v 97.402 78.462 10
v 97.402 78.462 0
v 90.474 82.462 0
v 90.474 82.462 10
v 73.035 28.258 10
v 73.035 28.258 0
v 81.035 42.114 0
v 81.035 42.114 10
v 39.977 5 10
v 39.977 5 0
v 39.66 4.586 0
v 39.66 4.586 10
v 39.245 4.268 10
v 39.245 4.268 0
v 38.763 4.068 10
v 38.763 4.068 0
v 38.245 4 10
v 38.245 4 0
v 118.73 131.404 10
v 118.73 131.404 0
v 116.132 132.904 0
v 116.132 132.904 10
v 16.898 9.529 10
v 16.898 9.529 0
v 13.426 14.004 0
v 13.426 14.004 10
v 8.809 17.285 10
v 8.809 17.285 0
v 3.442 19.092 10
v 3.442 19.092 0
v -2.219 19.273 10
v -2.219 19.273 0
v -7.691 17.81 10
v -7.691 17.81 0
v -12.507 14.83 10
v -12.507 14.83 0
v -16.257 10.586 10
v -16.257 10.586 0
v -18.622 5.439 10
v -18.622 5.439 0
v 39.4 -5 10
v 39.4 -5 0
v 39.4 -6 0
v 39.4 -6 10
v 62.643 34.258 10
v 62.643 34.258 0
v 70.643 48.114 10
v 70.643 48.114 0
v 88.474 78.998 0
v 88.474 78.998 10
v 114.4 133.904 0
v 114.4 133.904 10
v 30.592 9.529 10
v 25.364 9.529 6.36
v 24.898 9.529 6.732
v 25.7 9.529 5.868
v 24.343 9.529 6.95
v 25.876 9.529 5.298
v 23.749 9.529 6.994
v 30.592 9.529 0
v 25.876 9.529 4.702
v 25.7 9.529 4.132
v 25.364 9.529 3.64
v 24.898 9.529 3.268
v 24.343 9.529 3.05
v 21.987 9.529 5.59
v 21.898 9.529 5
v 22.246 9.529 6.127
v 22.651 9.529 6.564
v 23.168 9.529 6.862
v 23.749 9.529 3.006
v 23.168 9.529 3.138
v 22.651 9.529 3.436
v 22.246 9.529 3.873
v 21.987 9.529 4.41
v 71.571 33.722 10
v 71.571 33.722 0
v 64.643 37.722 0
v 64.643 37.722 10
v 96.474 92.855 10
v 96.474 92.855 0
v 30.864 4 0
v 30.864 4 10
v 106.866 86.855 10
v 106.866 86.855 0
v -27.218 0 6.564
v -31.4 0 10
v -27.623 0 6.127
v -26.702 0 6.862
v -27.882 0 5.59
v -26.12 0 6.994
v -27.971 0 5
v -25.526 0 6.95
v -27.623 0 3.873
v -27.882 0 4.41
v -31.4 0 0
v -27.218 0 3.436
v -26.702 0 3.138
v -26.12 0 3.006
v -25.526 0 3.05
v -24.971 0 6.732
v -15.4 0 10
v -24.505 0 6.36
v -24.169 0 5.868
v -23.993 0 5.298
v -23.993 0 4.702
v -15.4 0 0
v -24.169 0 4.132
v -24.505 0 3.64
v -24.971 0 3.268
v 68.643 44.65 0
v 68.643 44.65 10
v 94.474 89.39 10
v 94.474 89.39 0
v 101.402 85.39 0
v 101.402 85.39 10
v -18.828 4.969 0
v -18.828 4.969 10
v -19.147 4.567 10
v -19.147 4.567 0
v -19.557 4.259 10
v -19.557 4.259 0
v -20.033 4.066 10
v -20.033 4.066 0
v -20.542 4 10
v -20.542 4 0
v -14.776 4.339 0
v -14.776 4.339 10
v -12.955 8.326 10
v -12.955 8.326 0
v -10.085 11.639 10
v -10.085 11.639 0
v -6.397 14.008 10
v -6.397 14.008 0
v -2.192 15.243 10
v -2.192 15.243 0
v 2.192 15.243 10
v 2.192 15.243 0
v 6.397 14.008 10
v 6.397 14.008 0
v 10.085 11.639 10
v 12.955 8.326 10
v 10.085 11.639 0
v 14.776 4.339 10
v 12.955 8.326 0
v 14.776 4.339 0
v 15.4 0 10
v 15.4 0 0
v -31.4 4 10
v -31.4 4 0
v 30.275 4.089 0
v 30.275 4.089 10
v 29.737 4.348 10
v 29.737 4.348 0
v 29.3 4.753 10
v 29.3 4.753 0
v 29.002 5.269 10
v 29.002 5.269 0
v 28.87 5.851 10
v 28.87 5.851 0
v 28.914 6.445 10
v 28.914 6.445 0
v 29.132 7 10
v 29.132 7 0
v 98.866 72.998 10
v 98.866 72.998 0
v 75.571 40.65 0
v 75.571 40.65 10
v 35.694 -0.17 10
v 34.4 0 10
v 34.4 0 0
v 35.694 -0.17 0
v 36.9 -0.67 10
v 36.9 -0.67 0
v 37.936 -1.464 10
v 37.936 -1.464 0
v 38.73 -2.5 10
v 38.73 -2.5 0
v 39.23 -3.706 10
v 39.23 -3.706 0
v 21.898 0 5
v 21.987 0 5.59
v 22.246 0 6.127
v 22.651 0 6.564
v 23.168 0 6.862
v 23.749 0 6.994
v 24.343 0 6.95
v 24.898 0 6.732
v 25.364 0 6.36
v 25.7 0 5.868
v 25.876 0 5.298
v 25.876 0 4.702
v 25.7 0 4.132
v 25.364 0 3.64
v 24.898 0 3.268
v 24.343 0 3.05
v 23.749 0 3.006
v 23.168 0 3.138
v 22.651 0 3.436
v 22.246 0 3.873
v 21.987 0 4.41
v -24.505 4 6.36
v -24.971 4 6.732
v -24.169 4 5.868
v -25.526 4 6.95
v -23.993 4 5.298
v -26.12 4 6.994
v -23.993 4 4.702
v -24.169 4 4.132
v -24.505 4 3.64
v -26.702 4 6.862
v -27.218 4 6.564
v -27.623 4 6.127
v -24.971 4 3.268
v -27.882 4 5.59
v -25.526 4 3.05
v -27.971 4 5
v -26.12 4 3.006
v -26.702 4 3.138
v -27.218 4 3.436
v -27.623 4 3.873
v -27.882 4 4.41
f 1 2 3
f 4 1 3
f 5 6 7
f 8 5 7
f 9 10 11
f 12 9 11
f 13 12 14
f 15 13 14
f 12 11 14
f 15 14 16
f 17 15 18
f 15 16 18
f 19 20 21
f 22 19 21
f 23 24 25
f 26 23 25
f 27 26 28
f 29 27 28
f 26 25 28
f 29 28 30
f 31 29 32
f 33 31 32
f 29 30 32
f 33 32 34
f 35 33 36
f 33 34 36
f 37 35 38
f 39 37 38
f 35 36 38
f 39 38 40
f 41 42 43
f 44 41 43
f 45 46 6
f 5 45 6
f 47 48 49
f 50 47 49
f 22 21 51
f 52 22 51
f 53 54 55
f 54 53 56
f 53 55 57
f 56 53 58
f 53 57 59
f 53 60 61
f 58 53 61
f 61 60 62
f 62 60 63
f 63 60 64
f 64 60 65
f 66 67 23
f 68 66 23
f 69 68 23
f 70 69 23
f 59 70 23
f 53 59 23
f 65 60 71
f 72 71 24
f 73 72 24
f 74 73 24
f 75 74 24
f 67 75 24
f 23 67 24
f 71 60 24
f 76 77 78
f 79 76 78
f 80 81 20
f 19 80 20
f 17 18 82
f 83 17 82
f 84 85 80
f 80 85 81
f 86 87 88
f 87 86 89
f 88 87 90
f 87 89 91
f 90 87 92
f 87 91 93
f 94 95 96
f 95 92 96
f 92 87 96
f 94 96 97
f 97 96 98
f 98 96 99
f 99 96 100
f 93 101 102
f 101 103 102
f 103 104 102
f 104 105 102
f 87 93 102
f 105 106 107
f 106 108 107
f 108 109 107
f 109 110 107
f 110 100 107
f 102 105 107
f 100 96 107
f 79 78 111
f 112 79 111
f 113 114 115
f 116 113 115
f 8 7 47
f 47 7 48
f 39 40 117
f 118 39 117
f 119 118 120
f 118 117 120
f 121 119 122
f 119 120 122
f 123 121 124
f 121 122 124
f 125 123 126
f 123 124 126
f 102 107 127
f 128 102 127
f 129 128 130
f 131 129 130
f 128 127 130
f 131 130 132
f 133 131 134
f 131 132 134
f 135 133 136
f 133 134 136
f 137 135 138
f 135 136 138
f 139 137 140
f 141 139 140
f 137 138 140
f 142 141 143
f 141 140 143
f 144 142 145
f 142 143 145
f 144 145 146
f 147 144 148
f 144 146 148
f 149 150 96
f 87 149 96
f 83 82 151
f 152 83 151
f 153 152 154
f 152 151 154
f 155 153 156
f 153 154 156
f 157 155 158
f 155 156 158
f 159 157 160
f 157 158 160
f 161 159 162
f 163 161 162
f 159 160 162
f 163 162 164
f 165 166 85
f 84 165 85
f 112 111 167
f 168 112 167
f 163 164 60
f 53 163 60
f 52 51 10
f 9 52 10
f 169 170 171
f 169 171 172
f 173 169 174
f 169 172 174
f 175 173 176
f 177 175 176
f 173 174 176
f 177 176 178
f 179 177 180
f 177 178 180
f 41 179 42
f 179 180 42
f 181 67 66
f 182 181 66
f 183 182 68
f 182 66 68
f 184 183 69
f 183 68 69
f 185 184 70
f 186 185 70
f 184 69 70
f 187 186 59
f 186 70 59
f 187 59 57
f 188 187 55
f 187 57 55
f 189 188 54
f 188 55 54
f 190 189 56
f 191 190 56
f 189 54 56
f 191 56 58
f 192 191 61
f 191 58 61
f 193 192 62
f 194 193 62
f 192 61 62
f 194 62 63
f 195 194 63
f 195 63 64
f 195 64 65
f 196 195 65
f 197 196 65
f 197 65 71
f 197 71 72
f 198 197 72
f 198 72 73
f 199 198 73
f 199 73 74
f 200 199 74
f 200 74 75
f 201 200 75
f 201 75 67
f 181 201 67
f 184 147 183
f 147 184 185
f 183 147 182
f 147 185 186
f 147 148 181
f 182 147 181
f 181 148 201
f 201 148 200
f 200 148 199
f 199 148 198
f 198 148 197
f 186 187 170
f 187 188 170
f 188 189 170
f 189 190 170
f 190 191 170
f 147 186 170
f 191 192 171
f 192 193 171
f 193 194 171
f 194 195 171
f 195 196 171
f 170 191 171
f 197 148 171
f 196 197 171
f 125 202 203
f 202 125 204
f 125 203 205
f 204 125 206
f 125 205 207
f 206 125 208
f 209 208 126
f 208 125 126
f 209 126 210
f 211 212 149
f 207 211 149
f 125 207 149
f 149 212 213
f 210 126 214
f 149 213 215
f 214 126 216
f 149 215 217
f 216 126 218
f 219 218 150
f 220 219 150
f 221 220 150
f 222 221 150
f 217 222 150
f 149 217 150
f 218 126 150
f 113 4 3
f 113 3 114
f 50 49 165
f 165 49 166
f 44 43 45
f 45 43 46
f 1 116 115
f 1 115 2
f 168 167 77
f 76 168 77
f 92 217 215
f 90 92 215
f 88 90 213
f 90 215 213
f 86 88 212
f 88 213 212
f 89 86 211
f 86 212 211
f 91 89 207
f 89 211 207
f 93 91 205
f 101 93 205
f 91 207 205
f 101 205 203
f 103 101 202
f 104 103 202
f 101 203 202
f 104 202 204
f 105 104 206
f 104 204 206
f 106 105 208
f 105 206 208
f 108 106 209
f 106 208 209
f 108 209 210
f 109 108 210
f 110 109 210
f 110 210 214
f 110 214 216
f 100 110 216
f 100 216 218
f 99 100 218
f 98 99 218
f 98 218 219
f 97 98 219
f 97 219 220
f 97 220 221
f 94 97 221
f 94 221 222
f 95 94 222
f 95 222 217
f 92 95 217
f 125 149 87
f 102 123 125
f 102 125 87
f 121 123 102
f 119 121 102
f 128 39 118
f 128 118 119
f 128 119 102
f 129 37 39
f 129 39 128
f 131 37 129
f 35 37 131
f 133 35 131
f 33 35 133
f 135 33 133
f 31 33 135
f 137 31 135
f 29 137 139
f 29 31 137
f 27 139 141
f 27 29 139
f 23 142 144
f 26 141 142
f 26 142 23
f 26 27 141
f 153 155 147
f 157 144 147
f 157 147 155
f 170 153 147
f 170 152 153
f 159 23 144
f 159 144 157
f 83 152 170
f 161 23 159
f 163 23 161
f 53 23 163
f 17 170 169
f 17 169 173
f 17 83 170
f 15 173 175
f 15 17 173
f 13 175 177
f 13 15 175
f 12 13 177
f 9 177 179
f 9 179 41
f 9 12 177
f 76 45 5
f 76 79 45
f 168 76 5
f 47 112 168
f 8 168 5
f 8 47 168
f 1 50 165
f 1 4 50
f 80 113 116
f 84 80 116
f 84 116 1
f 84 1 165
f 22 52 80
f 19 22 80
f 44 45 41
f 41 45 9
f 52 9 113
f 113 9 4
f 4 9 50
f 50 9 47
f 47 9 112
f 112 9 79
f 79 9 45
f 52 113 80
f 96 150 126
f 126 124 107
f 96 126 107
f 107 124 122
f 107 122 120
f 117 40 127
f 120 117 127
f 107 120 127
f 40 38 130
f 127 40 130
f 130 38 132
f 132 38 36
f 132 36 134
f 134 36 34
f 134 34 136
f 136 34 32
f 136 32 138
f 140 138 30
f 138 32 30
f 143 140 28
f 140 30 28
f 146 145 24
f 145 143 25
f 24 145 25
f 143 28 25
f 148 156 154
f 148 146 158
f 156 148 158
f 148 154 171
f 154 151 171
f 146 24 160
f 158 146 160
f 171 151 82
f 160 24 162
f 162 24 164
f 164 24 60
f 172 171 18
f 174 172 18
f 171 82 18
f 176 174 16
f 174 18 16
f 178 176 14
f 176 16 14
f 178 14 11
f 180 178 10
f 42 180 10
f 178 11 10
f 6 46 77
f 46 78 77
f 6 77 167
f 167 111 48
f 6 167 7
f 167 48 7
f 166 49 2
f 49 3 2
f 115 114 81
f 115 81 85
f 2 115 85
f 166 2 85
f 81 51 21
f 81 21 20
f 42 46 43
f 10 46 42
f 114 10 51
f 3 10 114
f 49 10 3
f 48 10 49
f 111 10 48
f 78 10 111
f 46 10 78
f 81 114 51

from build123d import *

# Parameters (mm, degrees)
F1_DEPTH = 10
F2_R     = 2
F3_DEPTH = 10.001
F4_R     = 2
F5_DEPTH = 15.530304


with BuildPart() as f1:
    # F0 (on Top) → F1 (new body)
    with BuildSketch(Plane.XY):
        with BuildLine():
            ThreePointArc((-15.4, 0), (0, 15.4), (15.4, 0))
            Line((15.4, 0), (19.4, 0))
            Line((19.4, 0), (34.4, 0))
            ThreePointArc((34.4, 0), (37.935534, -1.464466), (39.4, -5))
            Line((39.4, -5), (39.4, -6))
            Line((39.4, -6), (62.642914, 34.257907))
            Line((62.642914, 34.257907), (64.642914, 37.722009))
            Line((64.642914, 37.722009), (68.642914, 44.650212))
            Line((68.642914, 44.650212), (70.642914, 48.114314))
            Line((70.642914, 48.114314), (88.473701, 78.998144))
            Line((88.473701, 78.998144), (90.473701, 82.462245))
            Line((90.473701, 82.462245), (94.473701, 89.390449))
            Line((94.473701, 89.390449), (96.473701, 92.85455))
            Line((96.473701, 92.85455), (118.730127, 131.403811))
            Line((118.730127, 131.403811), (116.132051, 132.903811))
            Line((116.132051, 132.903811), (114.4, 133.903811))
            Line((114.4, 133.903811), (39.97735, 5))
            ThreePointArc((39.97735, 5), (39.245299, 4.267949), (38.245299, 4))
            Line((38.245299, 4), (30.864102, 4))
            ThreePointArc((30.864102, 4), (29.132051, 5), (29.132051, 7))
            Line((29.132051, 7), (30.592345, 9.529304))
            Line((30.592345, 9.529304), (16.898295, 9.529304))
            ThreePointArc((16.898295, 9.529304), (-2.219193, 19.272654), (-18.621883, 5.439252))
            ThreePointArc((-18.621883, 5.439252), (-19.341977, 4.399766), (-20.541665, 4))
            Line((-20.541665, 4), (-31.4, 4))
            Line((-31.4, 4), (-31.4, 0))
            Line((-31.4, 0), (-19.4, 0))
            Line((-19.4, 0), (-15.4, 0))
        make_face()
        Polygon((64.642914, 37.722009), (62.642914, 34.257907), (73.035219, 28.257907), (81.035219, 42.114314), (70.642914, 48.114314), (68.642914, 44.650212), (75.571117, 40.650212), (71.571117, 33.722009), align=None)
        Polygon((90.473701, 82.462245), (88.473701, 78.998144), (98.866006, 72.998144), (106.866006, 86.85455), (96.473701, 92.85455), (94.473701, 89.390449), (101.401904, 85.390449), (97.401904, 78.462245), align=None)
    extrude(amount=F1_DEPTH)

    # F2 (on face) → F3 (cut, through all)
    with BuildSketch(Plane(origin=(0, 4, 0), x_dir=(-1, 0, 0), z_dir=(0, 1, 0))):
        with Locations((25.970832, 5)):
            Circle(F2_R)
    extrude(amount=-F3_DEPTH, mode=Mode.SUBTRACT)

    # F4 (on face) → F5 (cut, through all)
    with BuildSketch(Plane(origin=(0, 9.529304, 0), x_dir=(-1, 0, 0), z_dir=(0, 1, 0))):
        with Locations((-23.898295, 5)):
            Circle(F4_R)
    extrude(amount=-F5_DEPTH, mode=Mode.SUBTRACT)


solid = f1.part
